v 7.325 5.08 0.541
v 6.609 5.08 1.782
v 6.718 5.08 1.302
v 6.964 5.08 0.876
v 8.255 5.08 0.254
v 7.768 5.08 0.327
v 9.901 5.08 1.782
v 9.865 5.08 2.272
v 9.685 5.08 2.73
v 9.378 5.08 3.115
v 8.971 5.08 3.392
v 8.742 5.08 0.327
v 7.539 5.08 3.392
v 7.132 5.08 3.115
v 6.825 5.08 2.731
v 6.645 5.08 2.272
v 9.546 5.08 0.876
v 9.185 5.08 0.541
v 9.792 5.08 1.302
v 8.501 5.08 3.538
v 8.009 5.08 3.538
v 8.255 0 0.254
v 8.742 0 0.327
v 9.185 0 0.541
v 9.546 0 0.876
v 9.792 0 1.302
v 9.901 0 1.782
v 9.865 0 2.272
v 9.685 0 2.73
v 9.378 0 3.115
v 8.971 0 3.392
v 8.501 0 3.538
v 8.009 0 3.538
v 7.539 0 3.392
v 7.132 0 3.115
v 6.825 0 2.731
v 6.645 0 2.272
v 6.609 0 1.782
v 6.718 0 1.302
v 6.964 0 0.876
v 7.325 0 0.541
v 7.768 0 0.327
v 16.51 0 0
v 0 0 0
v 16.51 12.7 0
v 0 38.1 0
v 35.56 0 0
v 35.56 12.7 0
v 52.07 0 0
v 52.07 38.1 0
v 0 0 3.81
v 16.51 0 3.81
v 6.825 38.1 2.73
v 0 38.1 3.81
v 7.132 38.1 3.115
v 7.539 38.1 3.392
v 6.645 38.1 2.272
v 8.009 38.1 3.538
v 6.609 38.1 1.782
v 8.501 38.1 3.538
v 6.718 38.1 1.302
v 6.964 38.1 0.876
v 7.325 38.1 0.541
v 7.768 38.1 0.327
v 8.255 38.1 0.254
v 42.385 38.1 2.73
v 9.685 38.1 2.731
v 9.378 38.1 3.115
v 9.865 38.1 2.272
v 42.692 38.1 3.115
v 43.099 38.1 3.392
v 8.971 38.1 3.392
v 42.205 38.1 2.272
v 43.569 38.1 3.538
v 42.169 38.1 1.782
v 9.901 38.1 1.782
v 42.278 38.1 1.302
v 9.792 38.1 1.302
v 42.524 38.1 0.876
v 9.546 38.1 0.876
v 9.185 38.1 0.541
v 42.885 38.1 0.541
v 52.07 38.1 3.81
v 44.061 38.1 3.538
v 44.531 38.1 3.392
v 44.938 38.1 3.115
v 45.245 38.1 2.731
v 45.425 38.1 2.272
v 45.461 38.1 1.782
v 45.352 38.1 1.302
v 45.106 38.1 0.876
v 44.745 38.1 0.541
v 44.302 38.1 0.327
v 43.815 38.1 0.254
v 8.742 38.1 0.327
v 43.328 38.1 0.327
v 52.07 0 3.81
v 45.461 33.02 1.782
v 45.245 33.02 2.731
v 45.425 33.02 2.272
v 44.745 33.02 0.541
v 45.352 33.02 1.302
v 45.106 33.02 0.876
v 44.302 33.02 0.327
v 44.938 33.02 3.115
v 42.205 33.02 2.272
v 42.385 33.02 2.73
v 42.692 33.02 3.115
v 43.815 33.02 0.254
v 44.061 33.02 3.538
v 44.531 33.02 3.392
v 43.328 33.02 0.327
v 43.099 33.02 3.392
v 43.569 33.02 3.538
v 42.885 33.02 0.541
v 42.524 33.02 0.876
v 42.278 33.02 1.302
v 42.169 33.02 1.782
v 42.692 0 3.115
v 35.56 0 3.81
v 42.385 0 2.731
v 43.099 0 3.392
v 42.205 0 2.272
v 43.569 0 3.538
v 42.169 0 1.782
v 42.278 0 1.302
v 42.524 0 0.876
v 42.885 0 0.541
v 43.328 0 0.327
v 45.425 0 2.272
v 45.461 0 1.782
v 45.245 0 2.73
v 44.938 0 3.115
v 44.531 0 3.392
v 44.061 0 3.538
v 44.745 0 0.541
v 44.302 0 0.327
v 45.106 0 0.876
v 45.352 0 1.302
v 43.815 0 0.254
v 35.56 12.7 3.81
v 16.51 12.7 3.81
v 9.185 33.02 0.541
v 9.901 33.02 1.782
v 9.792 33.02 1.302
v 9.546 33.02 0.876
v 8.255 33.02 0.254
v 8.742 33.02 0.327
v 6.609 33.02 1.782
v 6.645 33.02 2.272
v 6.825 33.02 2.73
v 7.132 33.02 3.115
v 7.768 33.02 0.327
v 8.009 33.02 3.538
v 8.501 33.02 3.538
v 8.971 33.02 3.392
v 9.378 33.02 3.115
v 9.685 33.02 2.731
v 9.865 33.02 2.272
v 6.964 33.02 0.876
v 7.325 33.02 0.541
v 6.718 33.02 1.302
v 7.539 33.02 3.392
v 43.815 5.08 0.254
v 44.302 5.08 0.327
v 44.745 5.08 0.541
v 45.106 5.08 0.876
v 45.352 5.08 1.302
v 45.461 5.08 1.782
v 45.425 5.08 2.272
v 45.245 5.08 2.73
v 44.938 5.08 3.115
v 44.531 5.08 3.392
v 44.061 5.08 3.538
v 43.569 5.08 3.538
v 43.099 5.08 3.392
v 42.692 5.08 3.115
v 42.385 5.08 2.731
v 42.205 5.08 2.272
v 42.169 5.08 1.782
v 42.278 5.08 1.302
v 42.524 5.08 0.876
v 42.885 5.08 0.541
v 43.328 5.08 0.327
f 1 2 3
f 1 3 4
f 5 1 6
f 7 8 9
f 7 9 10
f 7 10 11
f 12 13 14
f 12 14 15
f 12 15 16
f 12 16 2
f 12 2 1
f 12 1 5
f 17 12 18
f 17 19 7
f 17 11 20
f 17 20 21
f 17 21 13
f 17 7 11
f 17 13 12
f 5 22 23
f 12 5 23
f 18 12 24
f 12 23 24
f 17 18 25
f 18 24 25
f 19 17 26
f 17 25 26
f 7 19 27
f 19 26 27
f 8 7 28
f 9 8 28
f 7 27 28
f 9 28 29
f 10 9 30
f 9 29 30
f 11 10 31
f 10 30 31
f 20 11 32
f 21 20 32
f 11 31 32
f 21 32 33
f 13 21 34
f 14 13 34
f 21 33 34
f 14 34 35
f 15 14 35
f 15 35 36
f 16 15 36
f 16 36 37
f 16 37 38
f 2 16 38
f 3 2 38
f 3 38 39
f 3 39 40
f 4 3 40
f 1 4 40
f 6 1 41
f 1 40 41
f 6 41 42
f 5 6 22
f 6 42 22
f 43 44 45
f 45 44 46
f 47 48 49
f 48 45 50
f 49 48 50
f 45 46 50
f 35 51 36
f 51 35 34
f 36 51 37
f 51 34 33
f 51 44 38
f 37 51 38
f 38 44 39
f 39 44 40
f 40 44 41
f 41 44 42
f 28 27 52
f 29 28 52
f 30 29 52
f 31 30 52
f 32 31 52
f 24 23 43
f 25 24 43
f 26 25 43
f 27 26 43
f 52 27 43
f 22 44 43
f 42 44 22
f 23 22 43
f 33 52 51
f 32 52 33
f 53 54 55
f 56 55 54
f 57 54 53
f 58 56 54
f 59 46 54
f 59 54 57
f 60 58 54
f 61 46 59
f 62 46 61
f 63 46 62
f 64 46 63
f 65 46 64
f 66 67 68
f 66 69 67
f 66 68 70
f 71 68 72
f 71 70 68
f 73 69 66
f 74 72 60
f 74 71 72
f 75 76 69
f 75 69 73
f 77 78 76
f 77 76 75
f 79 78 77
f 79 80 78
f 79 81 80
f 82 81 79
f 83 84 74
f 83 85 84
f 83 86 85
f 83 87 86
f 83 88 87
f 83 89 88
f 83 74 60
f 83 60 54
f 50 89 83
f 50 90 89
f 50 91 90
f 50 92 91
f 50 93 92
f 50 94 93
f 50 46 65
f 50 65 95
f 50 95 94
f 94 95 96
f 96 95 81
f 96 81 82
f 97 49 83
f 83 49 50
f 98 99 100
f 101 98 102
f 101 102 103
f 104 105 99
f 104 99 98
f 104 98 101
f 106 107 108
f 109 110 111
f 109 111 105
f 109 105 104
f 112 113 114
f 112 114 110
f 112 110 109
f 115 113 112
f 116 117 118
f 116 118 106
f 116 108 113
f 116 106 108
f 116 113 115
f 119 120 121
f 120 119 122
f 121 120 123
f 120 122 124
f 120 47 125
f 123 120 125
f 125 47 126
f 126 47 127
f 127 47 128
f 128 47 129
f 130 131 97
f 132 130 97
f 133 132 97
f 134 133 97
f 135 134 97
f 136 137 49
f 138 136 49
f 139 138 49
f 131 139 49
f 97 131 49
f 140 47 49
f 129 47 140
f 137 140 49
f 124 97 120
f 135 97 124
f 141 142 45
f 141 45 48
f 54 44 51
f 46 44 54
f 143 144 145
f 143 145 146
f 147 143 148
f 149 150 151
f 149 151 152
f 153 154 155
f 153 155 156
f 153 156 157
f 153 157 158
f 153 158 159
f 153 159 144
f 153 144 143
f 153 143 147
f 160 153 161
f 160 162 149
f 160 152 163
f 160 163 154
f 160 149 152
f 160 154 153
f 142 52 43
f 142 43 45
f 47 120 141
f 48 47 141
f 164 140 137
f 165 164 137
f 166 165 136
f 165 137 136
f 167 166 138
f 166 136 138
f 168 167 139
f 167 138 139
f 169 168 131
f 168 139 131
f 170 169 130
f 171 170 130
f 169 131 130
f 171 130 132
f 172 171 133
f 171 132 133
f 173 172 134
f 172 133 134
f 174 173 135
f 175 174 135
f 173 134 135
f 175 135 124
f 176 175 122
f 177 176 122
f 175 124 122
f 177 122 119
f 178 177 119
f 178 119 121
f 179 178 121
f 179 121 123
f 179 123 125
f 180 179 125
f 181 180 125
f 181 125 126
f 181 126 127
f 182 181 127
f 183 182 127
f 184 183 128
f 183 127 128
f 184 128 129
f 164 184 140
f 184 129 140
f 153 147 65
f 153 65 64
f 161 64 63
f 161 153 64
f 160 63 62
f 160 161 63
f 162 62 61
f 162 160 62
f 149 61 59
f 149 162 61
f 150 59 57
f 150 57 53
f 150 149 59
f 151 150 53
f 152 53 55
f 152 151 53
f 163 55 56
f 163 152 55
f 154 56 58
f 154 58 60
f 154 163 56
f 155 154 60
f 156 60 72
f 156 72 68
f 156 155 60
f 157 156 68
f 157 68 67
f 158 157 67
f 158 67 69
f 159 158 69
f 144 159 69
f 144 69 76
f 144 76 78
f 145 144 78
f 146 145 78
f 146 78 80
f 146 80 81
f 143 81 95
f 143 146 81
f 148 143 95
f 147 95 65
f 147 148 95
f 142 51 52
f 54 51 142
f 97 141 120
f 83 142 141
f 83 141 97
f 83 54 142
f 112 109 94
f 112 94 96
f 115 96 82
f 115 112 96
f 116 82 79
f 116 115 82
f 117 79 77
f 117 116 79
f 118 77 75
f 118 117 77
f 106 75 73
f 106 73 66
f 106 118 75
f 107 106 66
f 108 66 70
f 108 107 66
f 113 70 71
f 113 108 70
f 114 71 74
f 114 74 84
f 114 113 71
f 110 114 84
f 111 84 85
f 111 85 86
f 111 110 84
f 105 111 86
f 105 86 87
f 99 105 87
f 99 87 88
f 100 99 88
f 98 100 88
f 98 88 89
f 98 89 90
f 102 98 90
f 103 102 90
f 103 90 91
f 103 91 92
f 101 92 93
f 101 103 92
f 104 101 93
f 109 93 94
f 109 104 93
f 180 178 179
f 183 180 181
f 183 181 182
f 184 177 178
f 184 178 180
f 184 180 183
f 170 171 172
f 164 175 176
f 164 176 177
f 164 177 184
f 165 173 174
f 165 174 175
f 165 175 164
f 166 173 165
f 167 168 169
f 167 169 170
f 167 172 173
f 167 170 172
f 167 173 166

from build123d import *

# Parameters (mm, degrees)
SKETCH3_W           = 52.07
SKETCH3_H           = 38.1
BOSS_EXTRUDE2_DEPTH = 3.81
SKETCH4_W           = 19.05
SKETCH4_H           = 12.7
CUT_EXTRUDE1_DEPTH  = 65.632894102
SKETCH6_R           = 1.651
CUT_EXTRUDE2_DEPTH  = 5.08
CUT_EXTRUDE3_START  = -5.08
SKETCH8_R           = 1.651
CUT_EXTRUDE3_DEPTH  = 5.08


with BuildPart() as part:
    # Sketch3 → Boss-Extrude2 (new body)
    with BuildSketch(Plane.XY):
        with Locations((26.035, 19.05)):
            Rectangle(SKETCH3_W, SKETCH3_H)
    extrude(amount=BOSS_EXTRUDE2_DEPTH)

    # Sketch4 → Cut-Extrude1 (cut, through all)
    with BuildSketch(Plane.XY.offset(3.81)):
        with Locations((26.035, 6.35)):
            Rectangle(SKETCH4_W, SKETCH4_H)
    extrude(amount=-CUT_EXTRUDE1_DEPTH, mode=Mode.SUBTRACT)

    # Sketch6 → Cut-Extrude2 (cut)
    with BuildSketch(Plane.XZ):
        with Locations(Location((8.255, 1.905, 0), (0, 0, 270))):
            Circle(SKETCH6_R)
        with Locations(Location((43.815, 1.905, 0), (0, 0, 270))):
            Circle(SKETCH6_R)
    extrude(amount=-CUT_EXTRUDE2_DEPTH, mode=Mode.SUBTRACT)

    # Sketch8 → Cut-Extrude3 (cut)
    with BuildSketch(Plane(origin=(0, 38.1, 0), x_dir=(1, 0, 0), z_dir=(0, 1, 0)).offset(CUT_EXTRUDE3_START)):
        with Locations(Location((8.255, -1.905, 0), (0, 0, 90))):
            Circle(SKETCH8_R)
        with Locations(Location((43.815, -1.905, 0), (0, 0, 90))):
            Circle(SKETCH8_R)
    extrude(amount=CUT_EXTRUDE3_DEPTH, mode=Mode.SUBTRACT)


solid = part.part
